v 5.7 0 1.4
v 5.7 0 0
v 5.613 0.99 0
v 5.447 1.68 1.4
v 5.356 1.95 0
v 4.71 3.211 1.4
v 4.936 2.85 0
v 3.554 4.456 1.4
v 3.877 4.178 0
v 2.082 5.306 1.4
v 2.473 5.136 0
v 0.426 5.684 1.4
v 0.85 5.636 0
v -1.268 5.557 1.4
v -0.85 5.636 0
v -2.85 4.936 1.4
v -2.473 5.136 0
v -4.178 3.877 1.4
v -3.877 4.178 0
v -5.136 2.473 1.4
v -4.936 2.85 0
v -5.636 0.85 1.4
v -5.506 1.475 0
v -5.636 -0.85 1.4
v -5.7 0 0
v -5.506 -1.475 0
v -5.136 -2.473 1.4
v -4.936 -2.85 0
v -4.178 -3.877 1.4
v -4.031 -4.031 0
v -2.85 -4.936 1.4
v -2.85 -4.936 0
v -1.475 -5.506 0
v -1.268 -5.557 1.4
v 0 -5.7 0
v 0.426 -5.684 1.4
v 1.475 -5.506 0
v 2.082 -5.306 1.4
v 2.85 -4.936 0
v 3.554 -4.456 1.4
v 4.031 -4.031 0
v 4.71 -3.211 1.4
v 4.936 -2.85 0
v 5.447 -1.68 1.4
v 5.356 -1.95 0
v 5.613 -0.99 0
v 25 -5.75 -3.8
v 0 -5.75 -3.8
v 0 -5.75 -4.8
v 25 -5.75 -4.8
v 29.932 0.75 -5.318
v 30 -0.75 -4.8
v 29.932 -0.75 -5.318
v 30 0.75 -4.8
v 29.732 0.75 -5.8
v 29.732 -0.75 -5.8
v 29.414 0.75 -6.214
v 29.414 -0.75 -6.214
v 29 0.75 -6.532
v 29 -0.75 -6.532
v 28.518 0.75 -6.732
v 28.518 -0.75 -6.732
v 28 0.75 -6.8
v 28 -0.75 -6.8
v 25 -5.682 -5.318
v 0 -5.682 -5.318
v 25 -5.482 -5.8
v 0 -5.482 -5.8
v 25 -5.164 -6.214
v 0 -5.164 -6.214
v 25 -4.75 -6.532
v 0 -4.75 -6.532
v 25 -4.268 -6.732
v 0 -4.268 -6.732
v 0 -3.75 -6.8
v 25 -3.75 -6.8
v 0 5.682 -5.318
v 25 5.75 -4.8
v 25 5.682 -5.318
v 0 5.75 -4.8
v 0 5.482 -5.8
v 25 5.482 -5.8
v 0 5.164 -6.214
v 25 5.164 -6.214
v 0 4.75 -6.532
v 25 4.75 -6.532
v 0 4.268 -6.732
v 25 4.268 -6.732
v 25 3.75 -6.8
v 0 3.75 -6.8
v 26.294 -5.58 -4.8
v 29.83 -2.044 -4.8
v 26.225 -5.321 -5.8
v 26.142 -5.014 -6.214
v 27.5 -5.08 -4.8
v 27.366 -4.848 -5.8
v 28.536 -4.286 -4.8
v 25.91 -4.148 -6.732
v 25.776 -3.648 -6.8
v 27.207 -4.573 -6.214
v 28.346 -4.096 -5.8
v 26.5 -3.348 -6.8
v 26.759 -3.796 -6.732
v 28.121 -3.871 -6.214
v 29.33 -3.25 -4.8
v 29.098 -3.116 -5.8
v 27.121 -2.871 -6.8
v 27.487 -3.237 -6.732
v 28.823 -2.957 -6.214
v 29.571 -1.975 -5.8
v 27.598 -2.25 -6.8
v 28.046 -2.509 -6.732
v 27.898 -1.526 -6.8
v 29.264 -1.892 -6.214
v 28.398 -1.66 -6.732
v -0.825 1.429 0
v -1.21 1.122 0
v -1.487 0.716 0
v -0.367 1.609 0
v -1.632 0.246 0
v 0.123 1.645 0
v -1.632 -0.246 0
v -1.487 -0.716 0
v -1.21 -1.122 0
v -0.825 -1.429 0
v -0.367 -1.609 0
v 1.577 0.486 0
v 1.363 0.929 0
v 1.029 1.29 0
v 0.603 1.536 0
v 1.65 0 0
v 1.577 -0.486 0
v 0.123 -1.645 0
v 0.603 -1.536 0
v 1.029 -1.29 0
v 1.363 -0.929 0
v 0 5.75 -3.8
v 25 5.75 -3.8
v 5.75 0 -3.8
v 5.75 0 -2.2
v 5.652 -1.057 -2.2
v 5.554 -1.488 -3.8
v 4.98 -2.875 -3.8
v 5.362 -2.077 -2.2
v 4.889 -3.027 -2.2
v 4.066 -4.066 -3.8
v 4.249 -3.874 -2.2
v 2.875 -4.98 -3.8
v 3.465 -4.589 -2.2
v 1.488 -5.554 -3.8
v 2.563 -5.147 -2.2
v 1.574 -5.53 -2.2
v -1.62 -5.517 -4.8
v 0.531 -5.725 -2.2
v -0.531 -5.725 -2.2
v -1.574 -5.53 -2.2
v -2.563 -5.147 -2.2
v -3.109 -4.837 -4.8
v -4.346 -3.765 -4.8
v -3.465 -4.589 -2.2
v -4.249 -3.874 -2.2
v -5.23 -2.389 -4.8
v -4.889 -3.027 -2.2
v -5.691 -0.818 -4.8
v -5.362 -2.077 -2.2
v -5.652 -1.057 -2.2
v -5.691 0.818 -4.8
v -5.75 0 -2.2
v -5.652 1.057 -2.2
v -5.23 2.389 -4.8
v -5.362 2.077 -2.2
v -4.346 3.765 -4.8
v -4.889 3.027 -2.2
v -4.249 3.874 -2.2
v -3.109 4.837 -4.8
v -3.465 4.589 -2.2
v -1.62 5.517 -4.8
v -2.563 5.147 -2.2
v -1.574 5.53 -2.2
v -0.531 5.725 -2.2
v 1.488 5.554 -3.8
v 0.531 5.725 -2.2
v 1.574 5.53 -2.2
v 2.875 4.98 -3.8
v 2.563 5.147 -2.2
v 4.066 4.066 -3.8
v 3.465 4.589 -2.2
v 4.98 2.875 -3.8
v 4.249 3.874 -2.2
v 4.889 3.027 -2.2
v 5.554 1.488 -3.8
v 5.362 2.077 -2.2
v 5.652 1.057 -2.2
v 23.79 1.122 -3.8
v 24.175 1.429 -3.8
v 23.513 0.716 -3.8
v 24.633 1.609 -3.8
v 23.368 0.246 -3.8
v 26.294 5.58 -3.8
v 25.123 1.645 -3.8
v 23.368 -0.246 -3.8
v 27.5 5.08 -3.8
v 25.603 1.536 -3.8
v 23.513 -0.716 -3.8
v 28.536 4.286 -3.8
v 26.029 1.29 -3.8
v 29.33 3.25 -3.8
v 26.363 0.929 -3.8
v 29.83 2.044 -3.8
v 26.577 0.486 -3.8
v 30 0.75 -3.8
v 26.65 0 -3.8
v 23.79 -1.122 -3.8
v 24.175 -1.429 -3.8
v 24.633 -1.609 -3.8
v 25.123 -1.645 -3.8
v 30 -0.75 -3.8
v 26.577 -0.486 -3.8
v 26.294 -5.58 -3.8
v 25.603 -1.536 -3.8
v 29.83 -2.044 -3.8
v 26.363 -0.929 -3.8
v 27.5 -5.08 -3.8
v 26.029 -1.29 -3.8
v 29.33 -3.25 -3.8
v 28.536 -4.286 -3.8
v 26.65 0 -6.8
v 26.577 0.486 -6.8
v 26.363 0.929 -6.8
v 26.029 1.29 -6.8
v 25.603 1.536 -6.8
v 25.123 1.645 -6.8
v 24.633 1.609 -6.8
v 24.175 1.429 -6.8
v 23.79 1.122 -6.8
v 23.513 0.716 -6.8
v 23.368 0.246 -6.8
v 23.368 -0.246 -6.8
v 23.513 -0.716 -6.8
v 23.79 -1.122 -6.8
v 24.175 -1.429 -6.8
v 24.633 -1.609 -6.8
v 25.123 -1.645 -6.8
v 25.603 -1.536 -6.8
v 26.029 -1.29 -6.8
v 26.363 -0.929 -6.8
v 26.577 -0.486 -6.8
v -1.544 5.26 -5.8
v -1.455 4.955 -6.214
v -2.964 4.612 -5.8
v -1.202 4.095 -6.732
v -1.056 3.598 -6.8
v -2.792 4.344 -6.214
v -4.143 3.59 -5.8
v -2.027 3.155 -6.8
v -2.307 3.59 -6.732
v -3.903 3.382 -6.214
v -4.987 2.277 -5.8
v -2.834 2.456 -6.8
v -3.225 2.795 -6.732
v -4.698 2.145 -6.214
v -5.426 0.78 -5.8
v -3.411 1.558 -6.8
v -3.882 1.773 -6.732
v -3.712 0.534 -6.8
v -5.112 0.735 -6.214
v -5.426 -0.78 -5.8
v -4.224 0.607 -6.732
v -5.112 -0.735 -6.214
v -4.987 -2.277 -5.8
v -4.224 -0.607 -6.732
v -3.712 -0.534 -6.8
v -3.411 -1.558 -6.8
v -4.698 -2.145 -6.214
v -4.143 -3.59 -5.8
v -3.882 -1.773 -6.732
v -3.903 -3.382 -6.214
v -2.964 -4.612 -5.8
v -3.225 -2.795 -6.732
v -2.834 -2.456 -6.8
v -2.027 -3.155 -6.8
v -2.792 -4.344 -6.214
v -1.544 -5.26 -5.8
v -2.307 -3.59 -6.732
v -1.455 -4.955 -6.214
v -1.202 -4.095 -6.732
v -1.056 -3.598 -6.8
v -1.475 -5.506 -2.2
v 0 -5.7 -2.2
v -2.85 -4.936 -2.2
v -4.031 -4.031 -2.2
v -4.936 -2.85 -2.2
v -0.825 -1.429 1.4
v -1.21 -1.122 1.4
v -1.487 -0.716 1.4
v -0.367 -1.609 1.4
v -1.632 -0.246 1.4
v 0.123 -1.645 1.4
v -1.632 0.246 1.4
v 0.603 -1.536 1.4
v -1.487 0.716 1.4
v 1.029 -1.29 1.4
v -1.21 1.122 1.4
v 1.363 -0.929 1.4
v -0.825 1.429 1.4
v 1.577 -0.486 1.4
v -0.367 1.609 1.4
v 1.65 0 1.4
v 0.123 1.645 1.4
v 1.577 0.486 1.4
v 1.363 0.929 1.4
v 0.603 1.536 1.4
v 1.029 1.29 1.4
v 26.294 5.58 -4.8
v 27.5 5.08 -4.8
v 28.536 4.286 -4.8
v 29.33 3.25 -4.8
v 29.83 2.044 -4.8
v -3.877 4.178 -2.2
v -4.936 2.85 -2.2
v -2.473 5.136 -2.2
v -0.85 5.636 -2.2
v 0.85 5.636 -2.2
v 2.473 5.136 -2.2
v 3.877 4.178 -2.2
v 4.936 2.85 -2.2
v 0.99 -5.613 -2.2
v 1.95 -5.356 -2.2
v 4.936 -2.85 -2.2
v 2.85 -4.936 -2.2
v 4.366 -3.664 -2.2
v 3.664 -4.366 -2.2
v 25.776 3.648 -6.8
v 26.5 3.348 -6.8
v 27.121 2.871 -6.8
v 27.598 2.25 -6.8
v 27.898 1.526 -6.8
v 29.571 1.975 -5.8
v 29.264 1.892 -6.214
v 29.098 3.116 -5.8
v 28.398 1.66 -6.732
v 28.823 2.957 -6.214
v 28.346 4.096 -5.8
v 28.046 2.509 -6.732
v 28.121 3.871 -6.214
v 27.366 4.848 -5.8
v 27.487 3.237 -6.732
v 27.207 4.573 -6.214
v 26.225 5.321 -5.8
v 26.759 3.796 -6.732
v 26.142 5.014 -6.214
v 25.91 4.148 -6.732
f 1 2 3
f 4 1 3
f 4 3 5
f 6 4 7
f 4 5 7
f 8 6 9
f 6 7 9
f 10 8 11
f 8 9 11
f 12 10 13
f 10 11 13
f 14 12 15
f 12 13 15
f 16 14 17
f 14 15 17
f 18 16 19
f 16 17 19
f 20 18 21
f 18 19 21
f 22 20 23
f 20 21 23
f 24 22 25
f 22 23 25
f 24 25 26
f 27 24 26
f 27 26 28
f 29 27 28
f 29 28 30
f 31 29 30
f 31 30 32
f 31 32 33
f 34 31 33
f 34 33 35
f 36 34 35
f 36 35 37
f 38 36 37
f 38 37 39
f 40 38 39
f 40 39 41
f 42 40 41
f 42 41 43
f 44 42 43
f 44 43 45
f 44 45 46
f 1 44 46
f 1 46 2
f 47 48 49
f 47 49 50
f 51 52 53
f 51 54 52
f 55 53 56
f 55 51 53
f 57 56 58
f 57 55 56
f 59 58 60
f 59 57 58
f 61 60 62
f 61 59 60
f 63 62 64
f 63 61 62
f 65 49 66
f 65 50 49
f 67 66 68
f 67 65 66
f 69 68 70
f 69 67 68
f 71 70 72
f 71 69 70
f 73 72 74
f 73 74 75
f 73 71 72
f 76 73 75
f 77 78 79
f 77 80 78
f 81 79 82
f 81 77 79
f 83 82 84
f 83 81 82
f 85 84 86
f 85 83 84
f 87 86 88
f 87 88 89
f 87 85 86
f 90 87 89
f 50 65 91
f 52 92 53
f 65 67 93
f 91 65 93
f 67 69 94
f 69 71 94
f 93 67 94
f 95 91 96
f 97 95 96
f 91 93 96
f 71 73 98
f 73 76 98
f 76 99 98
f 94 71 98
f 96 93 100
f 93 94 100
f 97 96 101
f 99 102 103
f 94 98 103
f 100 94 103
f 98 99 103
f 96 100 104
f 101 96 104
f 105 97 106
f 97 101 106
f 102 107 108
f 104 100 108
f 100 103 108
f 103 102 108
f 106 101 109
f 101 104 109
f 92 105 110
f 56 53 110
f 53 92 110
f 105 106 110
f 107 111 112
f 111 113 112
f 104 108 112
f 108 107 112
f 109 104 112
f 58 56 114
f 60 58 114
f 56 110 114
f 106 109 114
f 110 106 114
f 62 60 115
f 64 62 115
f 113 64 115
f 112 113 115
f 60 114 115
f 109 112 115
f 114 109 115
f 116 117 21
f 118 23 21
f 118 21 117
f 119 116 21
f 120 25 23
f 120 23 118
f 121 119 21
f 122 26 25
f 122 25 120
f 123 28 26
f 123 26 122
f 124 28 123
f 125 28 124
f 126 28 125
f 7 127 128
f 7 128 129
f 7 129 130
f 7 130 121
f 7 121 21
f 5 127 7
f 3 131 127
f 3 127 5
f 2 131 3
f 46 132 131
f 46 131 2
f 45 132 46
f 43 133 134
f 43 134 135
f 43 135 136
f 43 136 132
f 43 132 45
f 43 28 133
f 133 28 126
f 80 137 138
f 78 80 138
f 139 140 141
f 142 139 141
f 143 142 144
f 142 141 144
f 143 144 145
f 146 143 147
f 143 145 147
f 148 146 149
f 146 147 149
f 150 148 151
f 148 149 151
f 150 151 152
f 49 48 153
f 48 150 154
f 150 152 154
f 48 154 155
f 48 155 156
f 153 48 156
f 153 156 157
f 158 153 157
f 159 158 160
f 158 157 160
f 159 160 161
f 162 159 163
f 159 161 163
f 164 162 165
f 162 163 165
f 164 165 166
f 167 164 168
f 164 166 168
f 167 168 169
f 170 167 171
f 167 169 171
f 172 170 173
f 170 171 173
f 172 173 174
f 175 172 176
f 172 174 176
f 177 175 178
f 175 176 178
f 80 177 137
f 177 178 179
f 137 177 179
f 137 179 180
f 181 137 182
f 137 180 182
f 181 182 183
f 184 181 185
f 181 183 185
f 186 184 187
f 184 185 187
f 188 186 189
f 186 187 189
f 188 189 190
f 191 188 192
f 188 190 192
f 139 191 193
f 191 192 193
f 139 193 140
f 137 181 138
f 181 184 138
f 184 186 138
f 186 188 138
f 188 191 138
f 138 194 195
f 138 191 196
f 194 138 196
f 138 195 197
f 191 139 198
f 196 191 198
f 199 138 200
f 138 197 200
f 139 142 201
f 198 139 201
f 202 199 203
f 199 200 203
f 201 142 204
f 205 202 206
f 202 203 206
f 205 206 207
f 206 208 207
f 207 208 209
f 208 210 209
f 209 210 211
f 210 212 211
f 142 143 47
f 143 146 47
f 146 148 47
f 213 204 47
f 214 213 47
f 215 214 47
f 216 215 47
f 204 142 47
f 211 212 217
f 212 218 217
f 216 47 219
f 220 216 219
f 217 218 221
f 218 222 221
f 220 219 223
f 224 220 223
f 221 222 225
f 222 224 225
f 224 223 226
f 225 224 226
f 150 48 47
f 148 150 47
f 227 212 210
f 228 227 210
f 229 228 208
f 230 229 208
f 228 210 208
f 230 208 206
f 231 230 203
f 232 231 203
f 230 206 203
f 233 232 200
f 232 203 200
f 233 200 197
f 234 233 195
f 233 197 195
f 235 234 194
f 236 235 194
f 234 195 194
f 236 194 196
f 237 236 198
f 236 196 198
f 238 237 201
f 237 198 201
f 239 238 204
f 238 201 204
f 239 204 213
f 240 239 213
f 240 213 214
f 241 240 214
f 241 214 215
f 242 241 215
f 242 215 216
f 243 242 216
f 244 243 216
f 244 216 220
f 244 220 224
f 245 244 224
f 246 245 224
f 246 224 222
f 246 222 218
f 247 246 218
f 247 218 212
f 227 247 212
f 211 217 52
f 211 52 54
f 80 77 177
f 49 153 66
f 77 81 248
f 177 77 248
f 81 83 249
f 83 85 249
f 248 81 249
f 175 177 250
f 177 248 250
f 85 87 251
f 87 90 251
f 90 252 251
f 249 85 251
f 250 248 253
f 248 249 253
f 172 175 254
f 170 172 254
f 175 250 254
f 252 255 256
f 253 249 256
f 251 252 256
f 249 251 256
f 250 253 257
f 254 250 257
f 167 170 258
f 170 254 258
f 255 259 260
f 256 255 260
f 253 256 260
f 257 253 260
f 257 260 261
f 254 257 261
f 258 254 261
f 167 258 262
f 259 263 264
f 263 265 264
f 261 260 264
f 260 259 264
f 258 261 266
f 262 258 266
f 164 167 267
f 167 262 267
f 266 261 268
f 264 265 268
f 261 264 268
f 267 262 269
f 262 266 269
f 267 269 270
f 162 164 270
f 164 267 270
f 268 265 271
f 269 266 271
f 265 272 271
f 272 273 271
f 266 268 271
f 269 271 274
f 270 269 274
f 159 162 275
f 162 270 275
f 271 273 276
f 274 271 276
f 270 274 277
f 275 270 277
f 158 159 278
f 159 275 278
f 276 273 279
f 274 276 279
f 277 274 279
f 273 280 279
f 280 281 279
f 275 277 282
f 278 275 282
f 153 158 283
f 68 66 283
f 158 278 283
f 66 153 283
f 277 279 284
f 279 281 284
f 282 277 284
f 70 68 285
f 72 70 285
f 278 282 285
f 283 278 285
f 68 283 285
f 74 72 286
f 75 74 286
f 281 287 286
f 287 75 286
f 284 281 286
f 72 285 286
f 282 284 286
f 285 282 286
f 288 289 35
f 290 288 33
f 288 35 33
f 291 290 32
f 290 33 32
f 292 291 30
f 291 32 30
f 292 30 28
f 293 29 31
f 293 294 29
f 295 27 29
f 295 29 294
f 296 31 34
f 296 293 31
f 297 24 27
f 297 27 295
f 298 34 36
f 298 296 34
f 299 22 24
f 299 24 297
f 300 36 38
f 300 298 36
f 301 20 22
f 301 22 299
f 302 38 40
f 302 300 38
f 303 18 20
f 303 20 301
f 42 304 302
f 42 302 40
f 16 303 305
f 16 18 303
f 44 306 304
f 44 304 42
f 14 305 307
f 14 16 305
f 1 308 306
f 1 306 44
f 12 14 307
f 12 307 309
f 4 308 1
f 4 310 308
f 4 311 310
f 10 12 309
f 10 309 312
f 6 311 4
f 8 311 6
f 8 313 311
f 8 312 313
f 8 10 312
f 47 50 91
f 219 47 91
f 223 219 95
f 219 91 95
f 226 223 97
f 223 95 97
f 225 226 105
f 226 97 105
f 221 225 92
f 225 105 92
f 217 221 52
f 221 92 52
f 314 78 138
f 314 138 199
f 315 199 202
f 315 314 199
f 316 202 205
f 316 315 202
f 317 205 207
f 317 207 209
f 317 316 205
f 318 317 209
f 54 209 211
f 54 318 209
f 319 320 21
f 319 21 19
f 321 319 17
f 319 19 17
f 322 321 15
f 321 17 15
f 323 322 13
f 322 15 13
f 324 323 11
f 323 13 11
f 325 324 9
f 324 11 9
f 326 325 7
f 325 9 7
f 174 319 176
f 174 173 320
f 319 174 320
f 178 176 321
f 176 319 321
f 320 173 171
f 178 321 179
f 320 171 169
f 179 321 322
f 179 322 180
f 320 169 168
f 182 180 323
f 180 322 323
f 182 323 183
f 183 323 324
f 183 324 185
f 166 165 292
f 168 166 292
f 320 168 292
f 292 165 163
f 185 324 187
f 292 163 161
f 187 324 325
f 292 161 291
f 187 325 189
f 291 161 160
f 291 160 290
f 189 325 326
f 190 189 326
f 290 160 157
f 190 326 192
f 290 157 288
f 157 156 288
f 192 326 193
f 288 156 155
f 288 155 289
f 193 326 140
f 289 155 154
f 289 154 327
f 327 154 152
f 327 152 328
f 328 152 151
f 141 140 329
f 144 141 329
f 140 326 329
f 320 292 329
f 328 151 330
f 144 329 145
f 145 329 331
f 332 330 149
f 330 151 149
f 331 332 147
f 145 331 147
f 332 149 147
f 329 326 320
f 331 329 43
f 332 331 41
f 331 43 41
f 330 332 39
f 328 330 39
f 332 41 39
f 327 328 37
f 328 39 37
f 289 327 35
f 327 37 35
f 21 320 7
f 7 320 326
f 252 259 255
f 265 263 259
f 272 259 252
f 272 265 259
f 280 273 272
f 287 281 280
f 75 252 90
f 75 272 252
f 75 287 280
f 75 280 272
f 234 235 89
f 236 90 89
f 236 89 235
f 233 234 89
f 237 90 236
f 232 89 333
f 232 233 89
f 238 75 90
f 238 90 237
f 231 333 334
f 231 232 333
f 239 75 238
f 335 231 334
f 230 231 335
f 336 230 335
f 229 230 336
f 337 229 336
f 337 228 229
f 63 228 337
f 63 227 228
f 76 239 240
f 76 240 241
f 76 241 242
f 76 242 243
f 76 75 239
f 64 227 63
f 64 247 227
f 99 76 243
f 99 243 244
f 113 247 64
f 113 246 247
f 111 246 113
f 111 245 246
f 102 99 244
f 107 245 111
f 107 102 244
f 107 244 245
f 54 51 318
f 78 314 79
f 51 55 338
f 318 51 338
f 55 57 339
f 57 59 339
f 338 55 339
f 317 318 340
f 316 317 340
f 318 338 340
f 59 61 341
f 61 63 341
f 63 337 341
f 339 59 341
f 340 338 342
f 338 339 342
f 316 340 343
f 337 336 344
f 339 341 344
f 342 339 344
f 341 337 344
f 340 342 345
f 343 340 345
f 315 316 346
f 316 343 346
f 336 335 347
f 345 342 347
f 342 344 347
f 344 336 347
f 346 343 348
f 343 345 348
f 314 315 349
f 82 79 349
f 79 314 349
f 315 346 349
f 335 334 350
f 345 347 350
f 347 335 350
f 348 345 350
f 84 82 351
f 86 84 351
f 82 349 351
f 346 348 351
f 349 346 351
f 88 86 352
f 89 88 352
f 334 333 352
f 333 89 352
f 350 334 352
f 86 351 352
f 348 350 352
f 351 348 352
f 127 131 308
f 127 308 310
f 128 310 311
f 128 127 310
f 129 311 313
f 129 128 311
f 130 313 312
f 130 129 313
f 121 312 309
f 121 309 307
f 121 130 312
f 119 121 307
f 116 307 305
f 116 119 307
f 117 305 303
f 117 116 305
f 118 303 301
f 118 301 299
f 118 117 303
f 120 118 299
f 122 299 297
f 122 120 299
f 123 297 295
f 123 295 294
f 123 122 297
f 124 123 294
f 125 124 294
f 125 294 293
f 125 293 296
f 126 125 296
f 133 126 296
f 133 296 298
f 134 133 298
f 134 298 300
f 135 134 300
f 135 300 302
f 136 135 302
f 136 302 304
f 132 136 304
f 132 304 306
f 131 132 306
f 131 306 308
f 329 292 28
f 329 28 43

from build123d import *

# Parameters (mm, degrees)
SKETCH121_R      = 5.7
SKETCH121_R_2    = 1.65
PAD123_DEPTH     = 1.4
PAD123_FACE3_R   = 5.7
PAD123_FACE3_R_2 = 1.65
PAD124_DEPTH     = 2.2
SKETCH122_W      = 27.339446
SKETCH122_H      = 5.7
POCKET083_DEPTH  = 2.2
SKETCH123_R      = 5.75
PAD125_DEPTH     = 1.6
PAD126_DEPTH     = 3
FILLET054_R      = 5
FILLET055_R      = 2
SKETCH125_R      = 1.65
POCKET084_DEPTH  = 5


with BuildPart() as part:
    # Sketch121 → Pad123 (new body)
    with BuildSketch(Plane.XY):
        Circle(SKETCH121_R)
        Circle(SKETCH121_R_2, mode=Mode.SUBTRACT)
    extrude(amount=PAD123_DEPTH)

    # Pad123 Face3 → Pad124 (add)
    with BuildSketch(Plane(origin=(0, 0, 0), x_dir=(0, -1, 0), z_dir=(0, 0, -1))):
        Circle(PAD123_FACE3_R)
        Circle(PAD123_FACE3_R_2, mode=Mode.SUBTRACT)
    extrude(amount=PAD124_DEPTH)

    # Sketch122 (on Face1 of Pad124) → Pocket083 (cut)
    with BuildSketch(Plane(origin=(0, 0, -2.2), x_dir=(1, 0, 0), z_dir=(0, 0, -1))):
        Rectangle(SKETCH122_W, SKETCH122_H)
    extrude(amount=-POCKET083_DEPTH, mode=Mode.SUBTRACT)

    # Sketch123 (on Face1 of Pocket083) → Pad125 (join)
    with BuildSketch(Plane(origin=(0, 0, -2.2), x_dir=(1, 0, 0), z_dir=(0, 0, -1))):
        Circle(SKETCH123_R)
    extrude(amount=PAD125_DEPTH)

    # Sketch124 (on Face3 of Pad125) → Pad126 (join)
    with BuildSketch(Plane(origin=(0, 0, -3.8), x_dir=(1, 0, 0), z_dir=(0, 0, -1))):
        with BuildLine():
            ThreePointArc((0, 5.75), (-5.75, 0), (0, -5.75))
            Line((0, -5.75), (30, -5.75))
            Line((30, 5.75), (30, -5.75))
            Line((0, 5.75), (30, 5.75))
        make_face()
    extrude(amount=PAD126_DEPTH)

    # Fillet054
    fillet054_edges = [part.edges().sort_by_distance(p)[0] for p in [
        (30, -5.75, -5.3),
        (30, 5.75, -5.3),
    ]]
    fillet(fillet054_edges, radius=FILLET054_R)

    # Fillet055
    fillet055_edges = [part.edges().sort_by_distance(p)[0] for p in [
        (28.535534, -4.285534, -6.8),
    ]]
    fillet(fillet055_edges, radius=FILLET055_R)

    # Sketch125 (on Face4 of Fillet055) → Pocket084 (cut)
    with BuildSketch(Plane.XY.offset(-3.8)):
        with Locations((25, 0)):
            Circle(SKETCH125_R)
    extrude(amount=-POCKET084_DEPTH, mode=Mode.SUBTRACT)


solid = part.part
